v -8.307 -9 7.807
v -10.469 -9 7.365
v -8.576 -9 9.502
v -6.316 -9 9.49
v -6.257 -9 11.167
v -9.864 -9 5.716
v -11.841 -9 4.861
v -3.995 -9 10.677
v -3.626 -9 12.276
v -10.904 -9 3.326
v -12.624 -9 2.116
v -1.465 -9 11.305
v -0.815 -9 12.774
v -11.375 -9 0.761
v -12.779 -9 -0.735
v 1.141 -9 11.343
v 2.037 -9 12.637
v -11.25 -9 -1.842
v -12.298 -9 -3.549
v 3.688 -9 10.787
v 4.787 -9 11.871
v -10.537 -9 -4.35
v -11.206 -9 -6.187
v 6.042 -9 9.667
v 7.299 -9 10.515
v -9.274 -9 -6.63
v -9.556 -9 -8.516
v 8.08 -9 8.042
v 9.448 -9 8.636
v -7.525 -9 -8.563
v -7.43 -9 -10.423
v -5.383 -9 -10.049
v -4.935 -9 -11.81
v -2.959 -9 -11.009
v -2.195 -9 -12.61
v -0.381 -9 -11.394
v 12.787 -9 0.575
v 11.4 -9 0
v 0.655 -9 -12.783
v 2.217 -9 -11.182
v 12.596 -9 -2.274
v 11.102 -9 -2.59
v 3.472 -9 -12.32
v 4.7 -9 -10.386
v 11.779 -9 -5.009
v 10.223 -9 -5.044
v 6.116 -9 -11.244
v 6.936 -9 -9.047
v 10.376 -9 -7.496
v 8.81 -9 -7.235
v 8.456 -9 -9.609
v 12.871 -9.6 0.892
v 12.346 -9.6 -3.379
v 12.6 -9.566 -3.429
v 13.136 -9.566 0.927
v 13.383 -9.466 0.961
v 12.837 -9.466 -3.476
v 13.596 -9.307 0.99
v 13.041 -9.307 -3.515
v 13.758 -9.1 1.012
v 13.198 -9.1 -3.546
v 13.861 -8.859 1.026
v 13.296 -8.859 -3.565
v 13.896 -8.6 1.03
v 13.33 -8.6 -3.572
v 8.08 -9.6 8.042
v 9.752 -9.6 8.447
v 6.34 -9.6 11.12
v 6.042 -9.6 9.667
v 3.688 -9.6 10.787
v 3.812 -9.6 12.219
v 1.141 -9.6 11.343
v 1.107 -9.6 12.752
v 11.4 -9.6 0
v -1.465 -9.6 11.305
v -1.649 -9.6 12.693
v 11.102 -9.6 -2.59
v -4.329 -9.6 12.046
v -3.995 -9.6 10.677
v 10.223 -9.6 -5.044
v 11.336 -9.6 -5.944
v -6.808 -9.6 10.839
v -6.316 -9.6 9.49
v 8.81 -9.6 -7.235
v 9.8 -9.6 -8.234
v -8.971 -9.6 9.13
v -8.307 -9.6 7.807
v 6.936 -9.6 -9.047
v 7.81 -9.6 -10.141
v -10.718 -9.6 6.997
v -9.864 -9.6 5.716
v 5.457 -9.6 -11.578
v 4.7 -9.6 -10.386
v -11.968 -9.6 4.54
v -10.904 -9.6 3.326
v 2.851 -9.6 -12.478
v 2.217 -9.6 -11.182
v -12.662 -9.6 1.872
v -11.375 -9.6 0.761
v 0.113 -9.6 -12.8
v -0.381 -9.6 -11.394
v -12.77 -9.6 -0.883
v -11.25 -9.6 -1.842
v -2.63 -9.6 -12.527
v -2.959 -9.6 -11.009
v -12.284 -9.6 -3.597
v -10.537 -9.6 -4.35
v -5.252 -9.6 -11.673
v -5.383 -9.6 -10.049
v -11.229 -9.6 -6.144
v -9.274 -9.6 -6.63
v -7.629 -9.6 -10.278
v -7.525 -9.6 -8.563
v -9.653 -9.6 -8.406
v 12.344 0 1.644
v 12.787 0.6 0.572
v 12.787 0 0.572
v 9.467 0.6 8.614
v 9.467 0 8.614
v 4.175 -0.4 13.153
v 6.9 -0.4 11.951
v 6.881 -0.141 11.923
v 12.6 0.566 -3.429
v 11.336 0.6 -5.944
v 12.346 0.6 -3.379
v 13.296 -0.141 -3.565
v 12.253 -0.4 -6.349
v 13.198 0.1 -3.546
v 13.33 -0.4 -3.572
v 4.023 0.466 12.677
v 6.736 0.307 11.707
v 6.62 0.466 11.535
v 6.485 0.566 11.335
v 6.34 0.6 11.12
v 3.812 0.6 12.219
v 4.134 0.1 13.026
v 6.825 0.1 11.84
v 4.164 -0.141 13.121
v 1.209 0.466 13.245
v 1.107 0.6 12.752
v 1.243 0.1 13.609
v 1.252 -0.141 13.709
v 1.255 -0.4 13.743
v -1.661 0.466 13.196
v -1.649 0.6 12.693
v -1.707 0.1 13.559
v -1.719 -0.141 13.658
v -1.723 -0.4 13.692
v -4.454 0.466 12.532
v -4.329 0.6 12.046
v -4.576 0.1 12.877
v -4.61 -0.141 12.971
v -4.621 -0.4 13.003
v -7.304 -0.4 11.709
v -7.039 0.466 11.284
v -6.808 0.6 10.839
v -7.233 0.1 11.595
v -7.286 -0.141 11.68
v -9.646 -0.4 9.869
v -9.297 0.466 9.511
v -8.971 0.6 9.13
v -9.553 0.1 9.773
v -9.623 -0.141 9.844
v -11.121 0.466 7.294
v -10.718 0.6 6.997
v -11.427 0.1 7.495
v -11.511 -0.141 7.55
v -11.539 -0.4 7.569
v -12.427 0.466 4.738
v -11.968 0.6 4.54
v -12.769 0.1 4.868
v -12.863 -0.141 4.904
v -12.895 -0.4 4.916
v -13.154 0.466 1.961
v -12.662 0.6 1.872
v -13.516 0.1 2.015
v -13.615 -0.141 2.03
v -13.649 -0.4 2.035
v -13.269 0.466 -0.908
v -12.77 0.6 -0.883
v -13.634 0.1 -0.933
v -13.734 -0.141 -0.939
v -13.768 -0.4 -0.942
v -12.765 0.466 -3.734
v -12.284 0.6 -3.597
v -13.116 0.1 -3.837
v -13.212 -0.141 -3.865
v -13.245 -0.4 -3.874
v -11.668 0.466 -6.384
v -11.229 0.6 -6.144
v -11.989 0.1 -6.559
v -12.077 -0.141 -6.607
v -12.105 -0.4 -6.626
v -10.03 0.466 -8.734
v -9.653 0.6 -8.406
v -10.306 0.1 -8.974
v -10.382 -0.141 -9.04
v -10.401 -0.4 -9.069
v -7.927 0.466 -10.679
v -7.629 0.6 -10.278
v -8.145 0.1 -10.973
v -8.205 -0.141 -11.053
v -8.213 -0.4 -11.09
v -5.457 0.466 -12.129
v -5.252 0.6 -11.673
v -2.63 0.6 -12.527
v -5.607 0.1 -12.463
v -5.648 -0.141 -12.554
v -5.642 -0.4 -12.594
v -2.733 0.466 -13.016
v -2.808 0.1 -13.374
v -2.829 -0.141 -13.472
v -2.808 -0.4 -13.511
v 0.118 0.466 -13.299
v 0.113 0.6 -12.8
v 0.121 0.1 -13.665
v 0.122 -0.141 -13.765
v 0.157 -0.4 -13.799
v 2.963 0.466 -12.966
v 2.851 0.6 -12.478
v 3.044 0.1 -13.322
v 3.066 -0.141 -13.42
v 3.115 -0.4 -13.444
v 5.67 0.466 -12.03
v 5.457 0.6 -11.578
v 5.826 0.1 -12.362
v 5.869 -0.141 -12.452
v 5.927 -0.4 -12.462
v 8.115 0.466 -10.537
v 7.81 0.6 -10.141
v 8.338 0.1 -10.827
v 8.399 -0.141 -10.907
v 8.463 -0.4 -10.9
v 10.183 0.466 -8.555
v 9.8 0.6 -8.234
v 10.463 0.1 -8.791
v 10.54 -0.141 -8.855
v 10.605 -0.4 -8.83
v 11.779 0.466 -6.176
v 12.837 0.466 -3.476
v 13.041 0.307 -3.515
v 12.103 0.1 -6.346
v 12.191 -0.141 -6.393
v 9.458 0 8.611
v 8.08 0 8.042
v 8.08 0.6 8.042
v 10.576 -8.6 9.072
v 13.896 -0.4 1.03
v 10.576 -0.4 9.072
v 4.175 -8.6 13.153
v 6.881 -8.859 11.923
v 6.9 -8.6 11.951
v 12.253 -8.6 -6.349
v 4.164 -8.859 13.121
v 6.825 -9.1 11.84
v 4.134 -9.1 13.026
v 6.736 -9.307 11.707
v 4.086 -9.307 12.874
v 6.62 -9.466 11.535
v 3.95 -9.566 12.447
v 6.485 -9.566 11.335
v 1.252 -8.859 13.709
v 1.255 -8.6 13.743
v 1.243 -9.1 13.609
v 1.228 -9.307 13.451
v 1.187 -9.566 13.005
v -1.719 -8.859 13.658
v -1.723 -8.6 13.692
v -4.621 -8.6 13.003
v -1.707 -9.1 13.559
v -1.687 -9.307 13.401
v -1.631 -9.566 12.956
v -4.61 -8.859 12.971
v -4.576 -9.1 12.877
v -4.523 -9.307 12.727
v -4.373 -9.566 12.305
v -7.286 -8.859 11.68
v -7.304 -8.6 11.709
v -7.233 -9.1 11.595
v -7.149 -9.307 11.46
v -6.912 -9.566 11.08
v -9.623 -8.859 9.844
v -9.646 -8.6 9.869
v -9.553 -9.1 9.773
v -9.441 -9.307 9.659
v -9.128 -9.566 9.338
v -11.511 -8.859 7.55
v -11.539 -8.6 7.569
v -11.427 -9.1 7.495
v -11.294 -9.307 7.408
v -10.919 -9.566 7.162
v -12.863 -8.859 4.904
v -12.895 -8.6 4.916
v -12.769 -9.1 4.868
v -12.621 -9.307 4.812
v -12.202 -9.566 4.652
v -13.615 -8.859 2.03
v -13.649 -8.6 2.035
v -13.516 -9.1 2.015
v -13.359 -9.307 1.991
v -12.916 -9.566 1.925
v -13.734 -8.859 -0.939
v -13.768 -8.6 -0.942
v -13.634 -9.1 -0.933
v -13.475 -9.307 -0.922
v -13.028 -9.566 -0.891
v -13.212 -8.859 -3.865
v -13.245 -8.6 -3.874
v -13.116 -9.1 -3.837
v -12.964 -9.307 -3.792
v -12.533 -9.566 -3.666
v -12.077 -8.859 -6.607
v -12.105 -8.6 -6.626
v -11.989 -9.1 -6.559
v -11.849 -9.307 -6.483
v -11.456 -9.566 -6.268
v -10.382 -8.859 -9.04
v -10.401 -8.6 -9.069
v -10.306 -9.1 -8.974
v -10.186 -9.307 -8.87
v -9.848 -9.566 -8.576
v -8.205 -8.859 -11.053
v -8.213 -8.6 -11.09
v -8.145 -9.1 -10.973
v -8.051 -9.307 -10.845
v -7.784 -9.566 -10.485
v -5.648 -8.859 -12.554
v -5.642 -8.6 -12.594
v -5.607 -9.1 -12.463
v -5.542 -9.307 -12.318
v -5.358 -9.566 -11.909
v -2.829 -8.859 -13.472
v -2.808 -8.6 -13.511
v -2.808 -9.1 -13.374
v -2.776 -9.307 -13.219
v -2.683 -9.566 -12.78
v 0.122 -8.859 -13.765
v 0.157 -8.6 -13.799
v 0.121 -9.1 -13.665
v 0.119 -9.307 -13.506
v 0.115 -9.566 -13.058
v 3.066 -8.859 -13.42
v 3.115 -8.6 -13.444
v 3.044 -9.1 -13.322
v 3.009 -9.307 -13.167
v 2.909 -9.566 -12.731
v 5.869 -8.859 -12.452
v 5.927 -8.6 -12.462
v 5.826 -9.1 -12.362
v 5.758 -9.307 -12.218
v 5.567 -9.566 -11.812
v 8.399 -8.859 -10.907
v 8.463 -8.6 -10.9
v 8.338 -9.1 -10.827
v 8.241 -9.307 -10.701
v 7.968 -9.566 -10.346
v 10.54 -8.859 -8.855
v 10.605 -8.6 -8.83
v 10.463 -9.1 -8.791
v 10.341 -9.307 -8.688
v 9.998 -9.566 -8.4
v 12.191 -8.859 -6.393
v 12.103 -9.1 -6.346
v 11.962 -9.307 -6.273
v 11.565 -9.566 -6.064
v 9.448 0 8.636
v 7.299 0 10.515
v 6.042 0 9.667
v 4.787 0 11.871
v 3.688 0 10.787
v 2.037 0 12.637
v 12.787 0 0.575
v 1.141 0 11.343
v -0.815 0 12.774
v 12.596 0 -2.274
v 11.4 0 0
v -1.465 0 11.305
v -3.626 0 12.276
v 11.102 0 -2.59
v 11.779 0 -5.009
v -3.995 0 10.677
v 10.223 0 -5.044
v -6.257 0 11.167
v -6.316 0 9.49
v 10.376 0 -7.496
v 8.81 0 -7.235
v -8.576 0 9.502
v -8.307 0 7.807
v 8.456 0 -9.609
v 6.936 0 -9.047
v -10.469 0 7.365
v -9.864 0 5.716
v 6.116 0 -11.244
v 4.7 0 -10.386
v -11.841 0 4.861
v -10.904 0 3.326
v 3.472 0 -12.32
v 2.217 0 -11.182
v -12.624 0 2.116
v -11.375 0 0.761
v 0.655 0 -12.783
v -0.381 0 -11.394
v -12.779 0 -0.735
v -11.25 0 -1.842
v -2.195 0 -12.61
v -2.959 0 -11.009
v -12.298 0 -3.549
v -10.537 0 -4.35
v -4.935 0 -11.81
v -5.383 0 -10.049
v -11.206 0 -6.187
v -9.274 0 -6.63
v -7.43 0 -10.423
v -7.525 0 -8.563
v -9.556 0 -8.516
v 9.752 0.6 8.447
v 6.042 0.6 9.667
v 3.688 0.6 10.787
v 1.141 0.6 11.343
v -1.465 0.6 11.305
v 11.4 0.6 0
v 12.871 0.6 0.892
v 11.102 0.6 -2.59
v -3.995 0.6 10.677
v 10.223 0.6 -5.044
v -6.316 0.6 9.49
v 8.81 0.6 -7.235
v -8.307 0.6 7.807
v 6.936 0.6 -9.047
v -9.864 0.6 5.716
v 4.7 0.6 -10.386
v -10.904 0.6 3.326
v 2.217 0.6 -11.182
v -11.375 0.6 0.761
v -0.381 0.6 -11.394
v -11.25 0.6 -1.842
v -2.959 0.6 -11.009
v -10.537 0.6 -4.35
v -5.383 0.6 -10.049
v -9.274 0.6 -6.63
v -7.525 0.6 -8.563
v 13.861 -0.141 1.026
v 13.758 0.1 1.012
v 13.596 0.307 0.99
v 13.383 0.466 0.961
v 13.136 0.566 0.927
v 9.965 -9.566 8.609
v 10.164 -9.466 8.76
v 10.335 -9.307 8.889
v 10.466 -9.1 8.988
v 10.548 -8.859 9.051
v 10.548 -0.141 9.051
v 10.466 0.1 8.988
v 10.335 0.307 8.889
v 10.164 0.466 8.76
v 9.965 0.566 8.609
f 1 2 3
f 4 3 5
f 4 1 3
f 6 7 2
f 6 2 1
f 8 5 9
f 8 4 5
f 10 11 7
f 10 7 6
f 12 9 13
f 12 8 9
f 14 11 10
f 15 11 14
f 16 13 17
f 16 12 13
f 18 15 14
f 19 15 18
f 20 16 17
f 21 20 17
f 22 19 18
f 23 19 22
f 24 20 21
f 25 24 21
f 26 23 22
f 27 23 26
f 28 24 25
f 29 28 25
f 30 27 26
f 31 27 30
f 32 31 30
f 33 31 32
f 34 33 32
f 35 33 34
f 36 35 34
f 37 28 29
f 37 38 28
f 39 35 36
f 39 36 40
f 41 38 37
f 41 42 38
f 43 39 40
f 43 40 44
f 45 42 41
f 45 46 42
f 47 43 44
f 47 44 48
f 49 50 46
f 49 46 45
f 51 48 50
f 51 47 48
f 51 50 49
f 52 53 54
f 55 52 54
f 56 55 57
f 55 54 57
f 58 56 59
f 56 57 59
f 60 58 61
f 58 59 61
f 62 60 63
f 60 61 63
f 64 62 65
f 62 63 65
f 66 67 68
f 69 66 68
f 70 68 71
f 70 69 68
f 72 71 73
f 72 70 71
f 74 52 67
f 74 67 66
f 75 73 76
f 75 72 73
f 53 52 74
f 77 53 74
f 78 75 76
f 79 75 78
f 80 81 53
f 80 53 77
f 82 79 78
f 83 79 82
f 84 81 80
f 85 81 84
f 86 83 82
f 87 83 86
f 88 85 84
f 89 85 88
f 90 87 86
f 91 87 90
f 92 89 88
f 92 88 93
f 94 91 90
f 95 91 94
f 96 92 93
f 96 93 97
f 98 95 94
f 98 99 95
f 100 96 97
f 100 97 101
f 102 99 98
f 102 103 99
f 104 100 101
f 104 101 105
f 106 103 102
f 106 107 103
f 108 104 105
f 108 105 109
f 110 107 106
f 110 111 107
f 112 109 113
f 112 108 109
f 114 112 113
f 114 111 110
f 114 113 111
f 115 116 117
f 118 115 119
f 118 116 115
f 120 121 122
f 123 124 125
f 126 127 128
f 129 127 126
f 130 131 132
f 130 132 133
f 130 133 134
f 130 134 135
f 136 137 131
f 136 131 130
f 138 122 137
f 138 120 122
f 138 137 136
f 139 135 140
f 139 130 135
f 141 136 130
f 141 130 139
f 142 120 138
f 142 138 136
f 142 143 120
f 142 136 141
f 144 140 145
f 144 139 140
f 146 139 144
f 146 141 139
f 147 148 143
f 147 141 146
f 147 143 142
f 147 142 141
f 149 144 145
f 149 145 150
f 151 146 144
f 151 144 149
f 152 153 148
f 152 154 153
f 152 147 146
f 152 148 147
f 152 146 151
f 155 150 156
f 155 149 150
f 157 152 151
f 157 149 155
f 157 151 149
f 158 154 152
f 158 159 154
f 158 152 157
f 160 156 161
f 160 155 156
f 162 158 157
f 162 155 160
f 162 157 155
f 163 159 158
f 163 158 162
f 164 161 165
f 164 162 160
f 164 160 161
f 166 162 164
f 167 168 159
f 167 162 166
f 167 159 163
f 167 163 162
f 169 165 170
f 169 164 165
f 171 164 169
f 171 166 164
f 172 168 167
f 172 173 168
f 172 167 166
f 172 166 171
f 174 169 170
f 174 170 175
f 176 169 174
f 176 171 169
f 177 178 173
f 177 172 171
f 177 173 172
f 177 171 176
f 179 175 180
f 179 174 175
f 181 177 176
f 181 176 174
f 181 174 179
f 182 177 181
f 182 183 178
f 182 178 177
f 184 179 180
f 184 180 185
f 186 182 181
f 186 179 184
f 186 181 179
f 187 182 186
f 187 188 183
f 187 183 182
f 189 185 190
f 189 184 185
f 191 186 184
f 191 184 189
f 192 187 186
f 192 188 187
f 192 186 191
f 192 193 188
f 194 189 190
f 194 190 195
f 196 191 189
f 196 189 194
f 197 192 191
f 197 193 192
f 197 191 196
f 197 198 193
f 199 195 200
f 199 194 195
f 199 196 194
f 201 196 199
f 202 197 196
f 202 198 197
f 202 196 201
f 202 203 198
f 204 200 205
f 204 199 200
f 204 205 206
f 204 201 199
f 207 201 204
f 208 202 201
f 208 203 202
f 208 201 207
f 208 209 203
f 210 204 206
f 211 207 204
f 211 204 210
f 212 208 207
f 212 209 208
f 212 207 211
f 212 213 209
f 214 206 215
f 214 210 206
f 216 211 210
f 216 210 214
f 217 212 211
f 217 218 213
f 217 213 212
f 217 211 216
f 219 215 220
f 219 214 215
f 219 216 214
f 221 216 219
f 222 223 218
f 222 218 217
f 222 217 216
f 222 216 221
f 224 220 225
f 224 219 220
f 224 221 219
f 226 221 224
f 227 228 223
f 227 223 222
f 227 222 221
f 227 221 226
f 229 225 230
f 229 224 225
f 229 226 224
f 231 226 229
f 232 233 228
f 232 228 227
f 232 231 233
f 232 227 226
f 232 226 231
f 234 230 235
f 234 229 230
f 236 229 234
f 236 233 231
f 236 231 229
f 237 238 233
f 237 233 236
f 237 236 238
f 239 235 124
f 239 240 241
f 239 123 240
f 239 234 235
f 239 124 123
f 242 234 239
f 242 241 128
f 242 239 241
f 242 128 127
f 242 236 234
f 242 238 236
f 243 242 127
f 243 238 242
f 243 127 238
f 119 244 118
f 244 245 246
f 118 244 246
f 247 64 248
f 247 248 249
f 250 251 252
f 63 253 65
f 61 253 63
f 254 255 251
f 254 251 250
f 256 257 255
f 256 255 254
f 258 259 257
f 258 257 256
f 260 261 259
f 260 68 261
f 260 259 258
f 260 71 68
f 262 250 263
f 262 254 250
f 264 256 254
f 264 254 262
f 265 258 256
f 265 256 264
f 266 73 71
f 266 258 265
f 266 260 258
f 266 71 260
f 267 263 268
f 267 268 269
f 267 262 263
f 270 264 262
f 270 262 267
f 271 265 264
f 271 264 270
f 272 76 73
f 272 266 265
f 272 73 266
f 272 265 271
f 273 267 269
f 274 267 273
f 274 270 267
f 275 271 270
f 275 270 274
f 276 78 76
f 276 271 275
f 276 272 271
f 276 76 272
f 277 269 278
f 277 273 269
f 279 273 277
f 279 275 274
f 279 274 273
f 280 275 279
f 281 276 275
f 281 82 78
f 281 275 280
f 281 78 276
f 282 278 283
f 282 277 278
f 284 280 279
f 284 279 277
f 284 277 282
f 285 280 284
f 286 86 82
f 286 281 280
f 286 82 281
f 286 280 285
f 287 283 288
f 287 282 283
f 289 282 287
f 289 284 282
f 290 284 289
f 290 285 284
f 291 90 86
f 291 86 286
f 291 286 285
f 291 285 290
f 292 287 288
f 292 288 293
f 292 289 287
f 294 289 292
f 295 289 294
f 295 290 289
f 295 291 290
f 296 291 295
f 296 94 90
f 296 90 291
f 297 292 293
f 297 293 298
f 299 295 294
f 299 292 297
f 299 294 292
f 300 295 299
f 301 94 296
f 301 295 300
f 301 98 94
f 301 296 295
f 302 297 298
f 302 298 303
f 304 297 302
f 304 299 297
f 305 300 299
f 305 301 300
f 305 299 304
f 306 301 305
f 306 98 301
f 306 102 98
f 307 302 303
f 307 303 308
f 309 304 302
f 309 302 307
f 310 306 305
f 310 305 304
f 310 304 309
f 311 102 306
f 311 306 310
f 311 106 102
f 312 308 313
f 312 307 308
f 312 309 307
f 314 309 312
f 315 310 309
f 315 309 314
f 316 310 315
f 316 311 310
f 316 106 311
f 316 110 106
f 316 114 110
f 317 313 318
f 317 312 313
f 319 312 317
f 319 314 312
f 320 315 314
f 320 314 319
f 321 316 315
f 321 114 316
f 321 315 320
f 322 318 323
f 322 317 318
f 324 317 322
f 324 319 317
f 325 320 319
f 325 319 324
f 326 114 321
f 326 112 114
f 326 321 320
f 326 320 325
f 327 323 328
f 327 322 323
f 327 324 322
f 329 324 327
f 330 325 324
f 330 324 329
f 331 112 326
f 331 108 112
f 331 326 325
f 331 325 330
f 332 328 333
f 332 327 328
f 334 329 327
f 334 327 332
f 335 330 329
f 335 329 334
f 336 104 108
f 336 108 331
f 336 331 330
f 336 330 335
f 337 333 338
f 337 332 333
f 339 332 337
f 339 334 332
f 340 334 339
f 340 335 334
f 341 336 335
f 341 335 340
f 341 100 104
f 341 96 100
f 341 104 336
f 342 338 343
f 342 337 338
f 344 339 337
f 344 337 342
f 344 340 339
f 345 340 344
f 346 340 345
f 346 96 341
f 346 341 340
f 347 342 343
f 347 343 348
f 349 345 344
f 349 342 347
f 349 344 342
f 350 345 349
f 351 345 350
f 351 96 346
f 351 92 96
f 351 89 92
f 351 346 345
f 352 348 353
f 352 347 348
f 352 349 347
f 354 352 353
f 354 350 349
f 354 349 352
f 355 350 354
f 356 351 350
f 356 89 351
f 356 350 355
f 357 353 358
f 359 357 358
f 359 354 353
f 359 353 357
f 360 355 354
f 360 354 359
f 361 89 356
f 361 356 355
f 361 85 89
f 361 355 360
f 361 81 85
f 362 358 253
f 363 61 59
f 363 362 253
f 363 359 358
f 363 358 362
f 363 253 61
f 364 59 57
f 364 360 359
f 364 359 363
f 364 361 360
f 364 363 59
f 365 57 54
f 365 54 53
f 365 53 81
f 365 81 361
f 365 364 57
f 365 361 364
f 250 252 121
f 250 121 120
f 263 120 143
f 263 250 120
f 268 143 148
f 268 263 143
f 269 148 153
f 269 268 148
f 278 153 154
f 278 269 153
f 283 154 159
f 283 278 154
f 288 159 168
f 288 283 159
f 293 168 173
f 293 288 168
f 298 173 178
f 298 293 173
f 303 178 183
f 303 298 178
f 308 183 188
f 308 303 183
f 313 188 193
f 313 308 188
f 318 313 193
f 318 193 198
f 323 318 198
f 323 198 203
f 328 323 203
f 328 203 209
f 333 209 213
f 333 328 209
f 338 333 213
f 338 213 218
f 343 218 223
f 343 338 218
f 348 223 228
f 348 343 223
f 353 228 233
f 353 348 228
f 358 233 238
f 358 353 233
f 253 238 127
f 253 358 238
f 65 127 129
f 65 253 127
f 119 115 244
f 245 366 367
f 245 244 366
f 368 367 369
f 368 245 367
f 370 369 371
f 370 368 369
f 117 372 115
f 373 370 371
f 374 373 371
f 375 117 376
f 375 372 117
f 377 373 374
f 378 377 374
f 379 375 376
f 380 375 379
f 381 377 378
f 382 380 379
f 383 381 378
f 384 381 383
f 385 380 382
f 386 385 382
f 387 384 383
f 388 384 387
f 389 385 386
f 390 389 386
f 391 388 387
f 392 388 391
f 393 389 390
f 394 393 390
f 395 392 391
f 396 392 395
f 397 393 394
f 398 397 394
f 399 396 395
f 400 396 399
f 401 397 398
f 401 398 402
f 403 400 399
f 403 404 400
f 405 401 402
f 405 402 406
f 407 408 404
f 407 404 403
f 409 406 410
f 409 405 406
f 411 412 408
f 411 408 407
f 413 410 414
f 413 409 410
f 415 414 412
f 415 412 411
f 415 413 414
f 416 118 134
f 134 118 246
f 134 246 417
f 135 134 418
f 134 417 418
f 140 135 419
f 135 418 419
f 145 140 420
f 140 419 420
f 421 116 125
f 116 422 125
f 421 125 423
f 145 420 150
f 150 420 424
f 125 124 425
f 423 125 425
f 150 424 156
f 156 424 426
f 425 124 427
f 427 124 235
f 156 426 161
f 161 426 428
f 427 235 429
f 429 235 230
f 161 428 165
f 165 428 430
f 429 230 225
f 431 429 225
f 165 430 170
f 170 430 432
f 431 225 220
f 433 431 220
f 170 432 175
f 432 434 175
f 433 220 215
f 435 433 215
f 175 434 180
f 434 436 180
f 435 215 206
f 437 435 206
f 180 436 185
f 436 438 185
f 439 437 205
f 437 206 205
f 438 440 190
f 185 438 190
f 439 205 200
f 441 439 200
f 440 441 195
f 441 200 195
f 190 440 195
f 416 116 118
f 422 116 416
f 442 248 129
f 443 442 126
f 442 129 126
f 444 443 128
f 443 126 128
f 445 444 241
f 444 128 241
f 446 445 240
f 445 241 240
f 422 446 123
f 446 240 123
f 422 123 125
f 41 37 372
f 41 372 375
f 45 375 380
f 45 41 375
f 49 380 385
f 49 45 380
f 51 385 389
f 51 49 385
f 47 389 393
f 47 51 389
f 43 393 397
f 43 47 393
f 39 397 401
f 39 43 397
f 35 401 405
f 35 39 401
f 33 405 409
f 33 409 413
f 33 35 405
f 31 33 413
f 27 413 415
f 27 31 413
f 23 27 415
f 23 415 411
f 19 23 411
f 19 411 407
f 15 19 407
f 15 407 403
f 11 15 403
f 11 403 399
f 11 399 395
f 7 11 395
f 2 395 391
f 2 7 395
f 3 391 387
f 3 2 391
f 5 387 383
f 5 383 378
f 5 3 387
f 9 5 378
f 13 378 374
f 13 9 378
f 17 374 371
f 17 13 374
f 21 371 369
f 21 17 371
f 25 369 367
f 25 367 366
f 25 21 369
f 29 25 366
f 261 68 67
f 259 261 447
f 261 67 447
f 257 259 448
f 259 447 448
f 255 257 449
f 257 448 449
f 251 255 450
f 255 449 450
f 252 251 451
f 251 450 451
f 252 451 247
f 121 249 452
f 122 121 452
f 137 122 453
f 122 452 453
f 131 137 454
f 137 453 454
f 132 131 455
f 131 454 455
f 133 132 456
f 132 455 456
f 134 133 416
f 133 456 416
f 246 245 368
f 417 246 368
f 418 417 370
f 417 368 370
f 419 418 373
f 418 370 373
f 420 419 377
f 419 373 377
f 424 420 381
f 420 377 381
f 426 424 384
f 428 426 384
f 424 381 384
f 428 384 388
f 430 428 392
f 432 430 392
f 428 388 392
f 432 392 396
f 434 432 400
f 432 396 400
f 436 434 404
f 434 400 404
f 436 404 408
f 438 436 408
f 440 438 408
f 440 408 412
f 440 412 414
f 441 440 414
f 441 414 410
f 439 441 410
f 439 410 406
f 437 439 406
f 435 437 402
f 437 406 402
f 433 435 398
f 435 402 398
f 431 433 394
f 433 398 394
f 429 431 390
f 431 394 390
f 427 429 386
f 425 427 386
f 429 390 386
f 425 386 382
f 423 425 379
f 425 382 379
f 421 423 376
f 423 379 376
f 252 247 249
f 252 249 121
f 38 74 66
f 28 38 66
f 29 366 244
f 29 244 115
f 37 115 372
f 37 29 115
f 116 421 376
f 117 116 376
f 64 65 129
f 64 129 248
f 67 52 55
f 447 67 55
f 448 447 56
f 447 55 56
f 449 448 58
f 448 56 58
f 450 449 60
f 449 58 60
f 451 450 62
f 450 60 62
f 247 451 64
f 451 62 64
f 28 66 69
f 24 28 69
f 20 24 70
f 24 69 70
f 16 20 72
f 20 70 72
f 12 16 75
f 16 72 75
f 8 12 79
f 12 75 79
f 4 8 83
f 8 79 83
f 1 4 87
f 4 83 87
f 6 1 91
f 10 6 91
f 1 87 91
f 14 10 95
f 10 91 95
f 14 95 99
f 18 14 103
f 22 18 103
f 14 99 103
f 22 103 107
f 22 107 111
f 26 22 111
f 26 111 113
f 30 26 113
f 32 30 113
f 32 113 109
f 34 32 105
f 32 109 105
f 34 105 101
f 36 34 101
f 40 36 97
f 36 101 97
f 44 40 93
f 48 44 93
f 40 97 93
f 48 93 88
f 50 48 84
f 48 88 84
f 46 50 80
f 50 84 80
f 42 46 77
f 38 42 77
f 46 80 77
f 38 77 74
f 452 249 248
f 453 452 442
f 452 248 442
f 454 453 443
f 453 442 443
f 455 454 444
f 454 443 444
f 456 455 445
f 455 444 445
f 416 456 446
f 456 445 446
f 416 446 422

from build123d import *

# Parameters (mm, degrees)
EXTRUDE_1_DEPTH     = 0.6
EXTRUDE_START       = 9
EXTRUDE_3_DEPTH     = 9
EXTRUDE_START_2     = 0.6
EXTRUDE_4_DEPTH     = 0.6
FILLET_1_R          = 1
FILLET_2_R          = 1
SKETCH_7_W          = 8.7
SKETCH_7_H          = 0.6
CUT_EXTRUDE_1_DEPTH = 1.5


with BuildPart() as part:
    # 草图1 → 凸台-拉伸1 (new body)
    with BuildSketch(Plane(origin=(0, 0, 0), x_dir=(1, 0, 0), z_dir=(0, 1, 0))):
        with BuildLine():
            Line((10.575971039, -9.071988551), (13.895707881, -1.030263158))
            Line((13.895707881, -1.030263158), (13.329776403, 3.571702822))
            ThreePointArc((13.329776403, 3.571702822), (-12.749537549, 5.281031367), (6.9, -11.951150572))
            Line((6.9, -11.951150572), (10.575971039, -9.071988551))
        make_face()
        with BuildLine():
            ThreePointArc((8.080263158, -8.041725393), (-10.537433274, 4.35), (11.4, 0))
            Line((11.4, 0), (8.080263158, -8.041725393))
        make_face(mode=Mode.SUBTRACT)
    extrude(amount=EXTRUDE_1_DEPTH)

    # 草图2 → 凸台-拉伸3 (add)
    with BuildSketch(Plane(origin=(0, 0, 0), x_dir=(-1, 0, 0), z_dir=(0, -1, 0)).offset(EXTRUDE_START)):
        with BuildLine():
            Line((-13.895707881, -1.030263158), (-10.575971039, -9.071988551))
            Line((-10.575971039, -9.071988551), (-6.9, -11.951150572))
            ThreePointArc((-6.9, -11.951150572), (12.749537549, 5.281031367), (-13.329776403, 3.571702822))
            Line((-13.329776403, 3.571702822), (-13.895707881, -1.030263158))
        make_face()
        with BuildLine():
            Line((-9.448115748, -8.635572293), (-12.787098442, -0.574554987))
            ThreePointArc((-12.787098442, -0.574554987), (11.825658016, 4.898347934), (-9.448115748, -8.635572293))
        make_face(mode=Mode.SUBTRACT)
    extrude(amount=-EXTRUDE_3_DEPTH)

    # 草图5 → 凸台-拉伸4 (add)
    with BuildSketch(Plane(origin=(0, -9, 0), x_dir=(-1, 0, 0), z_dir=(0, -1, 0)).offset(EXTRUDE_START_2)):
        with BuildLine():
            Line((-13.895707881, -1.030263158), (-10.575971039, -9.071988551))
            Line((-10.575971039, -9.071988551), (-6.9, -11.951150572))
            ThreePointArc((-6.9, -11.951150572), (12.749537549, 5.281031367), (-13.329776403, 3.571702822))
            Line((-13.329776403, 3.571702822), (-13.895707881, -1.030263158))
        make_face()
        with BuildLine():
            ThreePointArc((-11.4, 0), (10.537433274, 4.35), (-8.080263158, -8.041725393))
            Line((-8.080263158, -8.041725393), (-11.4, 0))
        make_face(mode=Mode.SUBTRACT)
    extrude(amount=-EXTRUDE_4_DEPTH)

    # 圆角1
    fillet_1_edges = [part.edges().sort_by_distance(p)[0] for p in [
        (13.612742142, -9.6, -1.270719832),
        (-12.749537549, -9.6, -5.281031367),
        (8.737985519, -9.6, 10.511569562),
        (12.23583946, -9.6, 5.051125854),
    ]]
    fillet(fillet_1_edges, radius=FILLET_1_R)

    # 圆角2
    fillet_2_edges = [part.edges().sort_by_distance(p)[0] for p in [
        (13.612742142, 0.6, -1.270719832),
        (-12.749537549, 0.6, -5.281031367),
        (8.737985519, 0.6, 10.511569562),
        (12.23583946, 0.6, 5.051125854),
    ]]
    fillet(fillet_2_edges, radius=FILLET_2_R)

    # 草图7 → 切除-拉伸1 (cut)
    with BuildSketch(Plane(origin=(9.740131579, 0, 4.020862697), x_dir=(-0.381578947368421, 0, 0.9243362520886043), z_dir=(-0.9243362520886043, 0, -0.381578947368421))):
        with Locations((0, 0.3)):
            Rectangle(SKETCH_7_W, SKETCH_7_H)
    extrude(amount=-CUT_EXTRUDE_1_DEPTH, mode=Mode.SUBTRACT)


solid = part.part
